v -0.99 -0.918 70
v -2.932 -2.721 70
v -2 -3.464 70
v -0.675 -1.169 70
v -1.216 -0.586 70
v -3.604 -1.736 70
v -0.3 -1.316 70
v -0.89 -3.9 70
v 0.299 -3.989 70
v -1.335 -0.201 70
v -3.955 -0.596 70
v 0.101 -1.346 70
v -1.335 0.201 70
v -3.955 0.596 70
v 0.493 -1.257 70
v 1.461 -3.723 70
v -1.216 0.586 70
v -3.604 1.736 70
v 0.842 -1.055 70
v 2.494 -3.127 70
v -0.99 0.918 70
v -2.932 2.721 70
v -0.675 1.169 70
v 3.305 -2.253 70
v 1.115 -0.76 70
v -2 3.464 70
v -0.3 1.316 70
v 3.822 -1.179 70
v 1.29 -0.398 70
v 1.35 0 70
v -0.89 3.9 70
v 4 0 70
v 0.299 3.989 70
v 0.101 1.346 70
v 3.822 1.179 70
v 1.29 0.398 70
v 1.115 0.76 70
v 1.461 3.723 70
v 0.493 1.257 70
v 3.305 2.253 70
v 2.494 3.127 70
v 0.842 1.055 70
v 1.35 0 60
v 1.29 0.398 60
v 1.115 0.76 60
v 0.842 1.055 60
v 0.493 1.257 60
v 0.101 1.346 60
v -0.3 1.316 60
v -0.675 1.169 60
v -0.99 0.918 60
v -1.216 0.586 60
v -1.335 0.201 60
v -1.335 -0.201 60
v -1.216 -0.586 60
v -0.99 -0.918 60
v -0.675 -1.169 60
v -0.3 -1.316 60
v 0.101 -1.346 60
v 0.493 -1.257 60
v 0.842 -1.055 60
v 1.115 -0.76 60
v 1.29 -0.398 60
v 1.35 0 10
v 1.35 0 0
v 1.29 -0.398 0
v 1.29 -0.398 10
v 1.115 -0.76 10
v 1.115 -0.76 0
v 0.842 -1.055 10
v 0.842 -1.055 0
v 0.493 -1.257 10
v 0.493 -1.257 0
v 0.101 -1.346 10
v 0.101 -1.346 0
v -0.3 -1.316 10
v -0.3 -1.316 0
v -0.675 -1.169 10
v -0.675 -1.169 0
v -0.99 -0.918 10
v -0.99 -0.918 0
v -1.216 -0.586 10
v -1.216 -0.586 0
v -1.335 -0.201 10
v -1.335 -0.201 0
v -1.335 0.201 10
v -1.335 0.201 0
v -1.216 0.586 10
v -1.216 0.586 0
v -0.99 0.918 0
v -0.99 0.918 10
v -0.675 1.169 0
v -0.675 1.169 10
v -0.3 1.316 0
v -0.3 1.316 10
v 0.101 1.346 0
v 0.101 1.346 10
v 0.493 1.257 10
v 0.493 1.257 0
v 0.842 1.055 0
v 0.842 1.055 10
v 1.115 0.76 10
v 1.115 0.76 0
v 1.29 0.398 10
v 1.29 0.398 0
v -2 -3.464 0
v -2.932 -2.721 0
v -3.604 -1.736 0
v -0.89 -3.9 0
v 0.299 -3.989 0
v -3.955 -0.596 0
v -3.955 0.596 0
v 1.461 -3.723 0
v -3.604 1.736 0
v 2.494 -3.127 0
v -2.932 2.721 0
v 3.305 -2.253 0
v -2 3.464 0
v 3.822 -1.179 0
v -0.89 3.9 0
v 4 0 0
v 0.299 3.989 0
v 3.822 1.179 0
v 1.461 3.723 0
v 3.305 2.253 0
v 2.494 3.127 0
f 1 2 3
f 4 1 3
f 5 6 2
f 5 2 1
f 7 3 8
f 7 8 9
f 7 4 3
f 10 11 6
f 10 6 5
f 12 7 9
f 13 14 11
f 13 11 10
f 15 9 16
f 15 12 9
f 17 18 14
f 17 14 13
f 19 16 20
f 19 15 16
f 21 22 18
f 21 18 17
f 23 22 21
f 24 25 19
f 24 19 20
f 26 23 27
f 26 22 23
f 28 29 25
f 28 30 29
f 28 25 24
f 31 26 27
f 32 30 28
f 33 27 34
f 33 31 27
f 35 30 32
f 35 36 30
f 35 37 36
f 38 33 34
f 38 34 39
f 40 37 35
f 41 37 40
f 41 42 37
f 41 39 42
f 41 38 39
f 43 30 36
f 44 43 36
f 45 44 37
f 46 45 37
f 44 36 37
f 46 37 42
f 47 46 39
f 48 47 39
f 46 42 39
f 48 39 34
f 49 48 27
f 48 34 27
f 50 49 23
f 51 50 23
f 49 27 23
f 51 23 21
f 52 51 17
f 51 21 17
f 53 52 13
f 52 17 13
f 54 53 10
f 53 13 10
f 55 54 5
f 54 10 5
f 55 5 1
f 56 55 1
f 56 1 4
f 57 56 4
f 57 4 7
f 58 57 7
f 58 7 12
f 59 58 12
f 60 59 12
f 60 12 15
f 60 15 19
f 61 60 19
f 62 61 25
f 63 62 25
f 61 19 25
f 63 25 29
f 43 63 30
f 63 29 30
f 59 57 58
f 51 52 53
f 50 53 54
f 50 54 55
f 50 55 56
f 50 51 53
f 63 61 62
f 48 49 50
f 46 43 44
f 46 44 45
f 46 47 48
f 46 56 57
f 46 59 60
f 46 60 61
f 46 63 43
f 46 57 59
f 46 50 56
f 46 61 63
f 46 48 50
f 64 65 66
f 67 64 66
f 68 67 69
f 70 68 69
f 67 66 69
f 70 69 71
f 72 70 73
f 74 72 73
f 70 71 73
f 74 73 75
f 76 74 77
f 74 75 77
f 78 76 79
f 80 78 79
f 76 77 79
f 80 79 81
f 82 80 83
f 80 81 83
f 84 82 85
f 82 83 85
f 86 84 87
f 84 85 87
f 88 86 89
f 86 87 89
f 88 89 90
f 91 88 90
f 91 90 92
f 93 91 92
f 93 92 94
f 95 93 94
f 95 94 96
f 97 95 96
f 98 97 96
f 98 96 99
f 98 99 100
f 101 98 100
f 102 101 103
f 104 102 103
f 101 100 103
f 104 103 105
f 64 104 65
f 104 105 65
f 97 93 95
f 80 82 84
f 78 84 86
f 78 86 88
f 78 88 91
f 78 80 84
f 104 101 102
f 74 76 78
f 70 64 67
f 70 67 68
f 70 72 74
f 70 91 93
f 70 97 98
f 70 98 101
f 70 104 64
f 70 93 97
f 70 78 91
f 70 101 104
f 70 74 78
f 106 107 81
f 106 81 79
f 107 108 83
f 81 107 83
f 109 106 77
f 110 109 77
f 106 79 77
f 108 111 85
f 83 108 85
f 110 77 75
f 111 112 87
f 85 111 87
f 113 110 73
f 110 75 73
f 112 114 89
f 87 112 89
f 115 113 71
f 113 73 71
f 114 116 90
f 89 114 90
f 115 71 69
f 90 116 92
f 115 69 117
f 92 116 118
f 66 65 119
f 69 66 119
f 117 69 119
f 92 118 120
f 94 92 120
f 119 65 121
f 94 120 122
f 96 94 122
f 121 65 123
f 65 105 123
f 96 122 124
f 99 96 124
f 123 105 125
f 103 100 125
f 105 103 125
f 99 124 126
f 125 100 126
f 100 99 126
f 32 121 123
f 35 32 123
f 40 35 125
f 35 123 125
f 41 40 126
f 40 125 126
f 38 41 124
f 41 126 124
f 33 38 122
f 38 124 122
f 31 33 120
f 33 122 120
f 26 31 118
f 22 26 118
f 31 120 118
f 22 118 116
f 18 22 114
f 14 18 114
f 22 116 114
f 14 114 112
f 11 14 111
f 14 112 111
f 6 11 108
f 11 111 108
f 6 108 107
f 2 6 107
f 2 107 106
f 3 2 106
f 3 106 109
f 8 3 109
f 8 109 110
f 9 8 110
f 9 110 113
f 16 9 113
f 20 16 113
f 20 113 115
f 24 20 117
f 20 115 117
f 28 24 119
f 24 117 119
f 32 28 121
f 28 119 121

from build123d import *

# Parameters (mm, degrees)
SKETCH_R        = 4
PAD_DEPTH       = 70
SKETCH001_R     = 1.35
POCKET_DEPTH    = 10
SKETCH002_R     = 1.35
POCKET001_DEPTH = 10


with BuildPart() as part:
    # Sketch → Pad (new body)
    with BuildSketch(Plane.XY):
        Circle(SKETCH_R)
    extrude(amount=PAD_DEPTH)

    # Sketch001 → Pocket (cut)
    with BuildSketch(Plane.XY.offset(70)):
        Circle(SKETCH001_R)
    extrude(amount=-POCKET_DEPTH, mode=Mode.SUBTRACT)

    # Sketch002 → Pocket001 (cut)
    with BuildSketch(Plane(origin=(0, 0, 0), x_dir=(1, 0, 0), z_dir=(0, 0, -1))):
        Circle(SKETCH002_R)
    extrude(amount=-POCKET001_DEPTH, mode=Mode.SUBTRACT)


solid = part.part
